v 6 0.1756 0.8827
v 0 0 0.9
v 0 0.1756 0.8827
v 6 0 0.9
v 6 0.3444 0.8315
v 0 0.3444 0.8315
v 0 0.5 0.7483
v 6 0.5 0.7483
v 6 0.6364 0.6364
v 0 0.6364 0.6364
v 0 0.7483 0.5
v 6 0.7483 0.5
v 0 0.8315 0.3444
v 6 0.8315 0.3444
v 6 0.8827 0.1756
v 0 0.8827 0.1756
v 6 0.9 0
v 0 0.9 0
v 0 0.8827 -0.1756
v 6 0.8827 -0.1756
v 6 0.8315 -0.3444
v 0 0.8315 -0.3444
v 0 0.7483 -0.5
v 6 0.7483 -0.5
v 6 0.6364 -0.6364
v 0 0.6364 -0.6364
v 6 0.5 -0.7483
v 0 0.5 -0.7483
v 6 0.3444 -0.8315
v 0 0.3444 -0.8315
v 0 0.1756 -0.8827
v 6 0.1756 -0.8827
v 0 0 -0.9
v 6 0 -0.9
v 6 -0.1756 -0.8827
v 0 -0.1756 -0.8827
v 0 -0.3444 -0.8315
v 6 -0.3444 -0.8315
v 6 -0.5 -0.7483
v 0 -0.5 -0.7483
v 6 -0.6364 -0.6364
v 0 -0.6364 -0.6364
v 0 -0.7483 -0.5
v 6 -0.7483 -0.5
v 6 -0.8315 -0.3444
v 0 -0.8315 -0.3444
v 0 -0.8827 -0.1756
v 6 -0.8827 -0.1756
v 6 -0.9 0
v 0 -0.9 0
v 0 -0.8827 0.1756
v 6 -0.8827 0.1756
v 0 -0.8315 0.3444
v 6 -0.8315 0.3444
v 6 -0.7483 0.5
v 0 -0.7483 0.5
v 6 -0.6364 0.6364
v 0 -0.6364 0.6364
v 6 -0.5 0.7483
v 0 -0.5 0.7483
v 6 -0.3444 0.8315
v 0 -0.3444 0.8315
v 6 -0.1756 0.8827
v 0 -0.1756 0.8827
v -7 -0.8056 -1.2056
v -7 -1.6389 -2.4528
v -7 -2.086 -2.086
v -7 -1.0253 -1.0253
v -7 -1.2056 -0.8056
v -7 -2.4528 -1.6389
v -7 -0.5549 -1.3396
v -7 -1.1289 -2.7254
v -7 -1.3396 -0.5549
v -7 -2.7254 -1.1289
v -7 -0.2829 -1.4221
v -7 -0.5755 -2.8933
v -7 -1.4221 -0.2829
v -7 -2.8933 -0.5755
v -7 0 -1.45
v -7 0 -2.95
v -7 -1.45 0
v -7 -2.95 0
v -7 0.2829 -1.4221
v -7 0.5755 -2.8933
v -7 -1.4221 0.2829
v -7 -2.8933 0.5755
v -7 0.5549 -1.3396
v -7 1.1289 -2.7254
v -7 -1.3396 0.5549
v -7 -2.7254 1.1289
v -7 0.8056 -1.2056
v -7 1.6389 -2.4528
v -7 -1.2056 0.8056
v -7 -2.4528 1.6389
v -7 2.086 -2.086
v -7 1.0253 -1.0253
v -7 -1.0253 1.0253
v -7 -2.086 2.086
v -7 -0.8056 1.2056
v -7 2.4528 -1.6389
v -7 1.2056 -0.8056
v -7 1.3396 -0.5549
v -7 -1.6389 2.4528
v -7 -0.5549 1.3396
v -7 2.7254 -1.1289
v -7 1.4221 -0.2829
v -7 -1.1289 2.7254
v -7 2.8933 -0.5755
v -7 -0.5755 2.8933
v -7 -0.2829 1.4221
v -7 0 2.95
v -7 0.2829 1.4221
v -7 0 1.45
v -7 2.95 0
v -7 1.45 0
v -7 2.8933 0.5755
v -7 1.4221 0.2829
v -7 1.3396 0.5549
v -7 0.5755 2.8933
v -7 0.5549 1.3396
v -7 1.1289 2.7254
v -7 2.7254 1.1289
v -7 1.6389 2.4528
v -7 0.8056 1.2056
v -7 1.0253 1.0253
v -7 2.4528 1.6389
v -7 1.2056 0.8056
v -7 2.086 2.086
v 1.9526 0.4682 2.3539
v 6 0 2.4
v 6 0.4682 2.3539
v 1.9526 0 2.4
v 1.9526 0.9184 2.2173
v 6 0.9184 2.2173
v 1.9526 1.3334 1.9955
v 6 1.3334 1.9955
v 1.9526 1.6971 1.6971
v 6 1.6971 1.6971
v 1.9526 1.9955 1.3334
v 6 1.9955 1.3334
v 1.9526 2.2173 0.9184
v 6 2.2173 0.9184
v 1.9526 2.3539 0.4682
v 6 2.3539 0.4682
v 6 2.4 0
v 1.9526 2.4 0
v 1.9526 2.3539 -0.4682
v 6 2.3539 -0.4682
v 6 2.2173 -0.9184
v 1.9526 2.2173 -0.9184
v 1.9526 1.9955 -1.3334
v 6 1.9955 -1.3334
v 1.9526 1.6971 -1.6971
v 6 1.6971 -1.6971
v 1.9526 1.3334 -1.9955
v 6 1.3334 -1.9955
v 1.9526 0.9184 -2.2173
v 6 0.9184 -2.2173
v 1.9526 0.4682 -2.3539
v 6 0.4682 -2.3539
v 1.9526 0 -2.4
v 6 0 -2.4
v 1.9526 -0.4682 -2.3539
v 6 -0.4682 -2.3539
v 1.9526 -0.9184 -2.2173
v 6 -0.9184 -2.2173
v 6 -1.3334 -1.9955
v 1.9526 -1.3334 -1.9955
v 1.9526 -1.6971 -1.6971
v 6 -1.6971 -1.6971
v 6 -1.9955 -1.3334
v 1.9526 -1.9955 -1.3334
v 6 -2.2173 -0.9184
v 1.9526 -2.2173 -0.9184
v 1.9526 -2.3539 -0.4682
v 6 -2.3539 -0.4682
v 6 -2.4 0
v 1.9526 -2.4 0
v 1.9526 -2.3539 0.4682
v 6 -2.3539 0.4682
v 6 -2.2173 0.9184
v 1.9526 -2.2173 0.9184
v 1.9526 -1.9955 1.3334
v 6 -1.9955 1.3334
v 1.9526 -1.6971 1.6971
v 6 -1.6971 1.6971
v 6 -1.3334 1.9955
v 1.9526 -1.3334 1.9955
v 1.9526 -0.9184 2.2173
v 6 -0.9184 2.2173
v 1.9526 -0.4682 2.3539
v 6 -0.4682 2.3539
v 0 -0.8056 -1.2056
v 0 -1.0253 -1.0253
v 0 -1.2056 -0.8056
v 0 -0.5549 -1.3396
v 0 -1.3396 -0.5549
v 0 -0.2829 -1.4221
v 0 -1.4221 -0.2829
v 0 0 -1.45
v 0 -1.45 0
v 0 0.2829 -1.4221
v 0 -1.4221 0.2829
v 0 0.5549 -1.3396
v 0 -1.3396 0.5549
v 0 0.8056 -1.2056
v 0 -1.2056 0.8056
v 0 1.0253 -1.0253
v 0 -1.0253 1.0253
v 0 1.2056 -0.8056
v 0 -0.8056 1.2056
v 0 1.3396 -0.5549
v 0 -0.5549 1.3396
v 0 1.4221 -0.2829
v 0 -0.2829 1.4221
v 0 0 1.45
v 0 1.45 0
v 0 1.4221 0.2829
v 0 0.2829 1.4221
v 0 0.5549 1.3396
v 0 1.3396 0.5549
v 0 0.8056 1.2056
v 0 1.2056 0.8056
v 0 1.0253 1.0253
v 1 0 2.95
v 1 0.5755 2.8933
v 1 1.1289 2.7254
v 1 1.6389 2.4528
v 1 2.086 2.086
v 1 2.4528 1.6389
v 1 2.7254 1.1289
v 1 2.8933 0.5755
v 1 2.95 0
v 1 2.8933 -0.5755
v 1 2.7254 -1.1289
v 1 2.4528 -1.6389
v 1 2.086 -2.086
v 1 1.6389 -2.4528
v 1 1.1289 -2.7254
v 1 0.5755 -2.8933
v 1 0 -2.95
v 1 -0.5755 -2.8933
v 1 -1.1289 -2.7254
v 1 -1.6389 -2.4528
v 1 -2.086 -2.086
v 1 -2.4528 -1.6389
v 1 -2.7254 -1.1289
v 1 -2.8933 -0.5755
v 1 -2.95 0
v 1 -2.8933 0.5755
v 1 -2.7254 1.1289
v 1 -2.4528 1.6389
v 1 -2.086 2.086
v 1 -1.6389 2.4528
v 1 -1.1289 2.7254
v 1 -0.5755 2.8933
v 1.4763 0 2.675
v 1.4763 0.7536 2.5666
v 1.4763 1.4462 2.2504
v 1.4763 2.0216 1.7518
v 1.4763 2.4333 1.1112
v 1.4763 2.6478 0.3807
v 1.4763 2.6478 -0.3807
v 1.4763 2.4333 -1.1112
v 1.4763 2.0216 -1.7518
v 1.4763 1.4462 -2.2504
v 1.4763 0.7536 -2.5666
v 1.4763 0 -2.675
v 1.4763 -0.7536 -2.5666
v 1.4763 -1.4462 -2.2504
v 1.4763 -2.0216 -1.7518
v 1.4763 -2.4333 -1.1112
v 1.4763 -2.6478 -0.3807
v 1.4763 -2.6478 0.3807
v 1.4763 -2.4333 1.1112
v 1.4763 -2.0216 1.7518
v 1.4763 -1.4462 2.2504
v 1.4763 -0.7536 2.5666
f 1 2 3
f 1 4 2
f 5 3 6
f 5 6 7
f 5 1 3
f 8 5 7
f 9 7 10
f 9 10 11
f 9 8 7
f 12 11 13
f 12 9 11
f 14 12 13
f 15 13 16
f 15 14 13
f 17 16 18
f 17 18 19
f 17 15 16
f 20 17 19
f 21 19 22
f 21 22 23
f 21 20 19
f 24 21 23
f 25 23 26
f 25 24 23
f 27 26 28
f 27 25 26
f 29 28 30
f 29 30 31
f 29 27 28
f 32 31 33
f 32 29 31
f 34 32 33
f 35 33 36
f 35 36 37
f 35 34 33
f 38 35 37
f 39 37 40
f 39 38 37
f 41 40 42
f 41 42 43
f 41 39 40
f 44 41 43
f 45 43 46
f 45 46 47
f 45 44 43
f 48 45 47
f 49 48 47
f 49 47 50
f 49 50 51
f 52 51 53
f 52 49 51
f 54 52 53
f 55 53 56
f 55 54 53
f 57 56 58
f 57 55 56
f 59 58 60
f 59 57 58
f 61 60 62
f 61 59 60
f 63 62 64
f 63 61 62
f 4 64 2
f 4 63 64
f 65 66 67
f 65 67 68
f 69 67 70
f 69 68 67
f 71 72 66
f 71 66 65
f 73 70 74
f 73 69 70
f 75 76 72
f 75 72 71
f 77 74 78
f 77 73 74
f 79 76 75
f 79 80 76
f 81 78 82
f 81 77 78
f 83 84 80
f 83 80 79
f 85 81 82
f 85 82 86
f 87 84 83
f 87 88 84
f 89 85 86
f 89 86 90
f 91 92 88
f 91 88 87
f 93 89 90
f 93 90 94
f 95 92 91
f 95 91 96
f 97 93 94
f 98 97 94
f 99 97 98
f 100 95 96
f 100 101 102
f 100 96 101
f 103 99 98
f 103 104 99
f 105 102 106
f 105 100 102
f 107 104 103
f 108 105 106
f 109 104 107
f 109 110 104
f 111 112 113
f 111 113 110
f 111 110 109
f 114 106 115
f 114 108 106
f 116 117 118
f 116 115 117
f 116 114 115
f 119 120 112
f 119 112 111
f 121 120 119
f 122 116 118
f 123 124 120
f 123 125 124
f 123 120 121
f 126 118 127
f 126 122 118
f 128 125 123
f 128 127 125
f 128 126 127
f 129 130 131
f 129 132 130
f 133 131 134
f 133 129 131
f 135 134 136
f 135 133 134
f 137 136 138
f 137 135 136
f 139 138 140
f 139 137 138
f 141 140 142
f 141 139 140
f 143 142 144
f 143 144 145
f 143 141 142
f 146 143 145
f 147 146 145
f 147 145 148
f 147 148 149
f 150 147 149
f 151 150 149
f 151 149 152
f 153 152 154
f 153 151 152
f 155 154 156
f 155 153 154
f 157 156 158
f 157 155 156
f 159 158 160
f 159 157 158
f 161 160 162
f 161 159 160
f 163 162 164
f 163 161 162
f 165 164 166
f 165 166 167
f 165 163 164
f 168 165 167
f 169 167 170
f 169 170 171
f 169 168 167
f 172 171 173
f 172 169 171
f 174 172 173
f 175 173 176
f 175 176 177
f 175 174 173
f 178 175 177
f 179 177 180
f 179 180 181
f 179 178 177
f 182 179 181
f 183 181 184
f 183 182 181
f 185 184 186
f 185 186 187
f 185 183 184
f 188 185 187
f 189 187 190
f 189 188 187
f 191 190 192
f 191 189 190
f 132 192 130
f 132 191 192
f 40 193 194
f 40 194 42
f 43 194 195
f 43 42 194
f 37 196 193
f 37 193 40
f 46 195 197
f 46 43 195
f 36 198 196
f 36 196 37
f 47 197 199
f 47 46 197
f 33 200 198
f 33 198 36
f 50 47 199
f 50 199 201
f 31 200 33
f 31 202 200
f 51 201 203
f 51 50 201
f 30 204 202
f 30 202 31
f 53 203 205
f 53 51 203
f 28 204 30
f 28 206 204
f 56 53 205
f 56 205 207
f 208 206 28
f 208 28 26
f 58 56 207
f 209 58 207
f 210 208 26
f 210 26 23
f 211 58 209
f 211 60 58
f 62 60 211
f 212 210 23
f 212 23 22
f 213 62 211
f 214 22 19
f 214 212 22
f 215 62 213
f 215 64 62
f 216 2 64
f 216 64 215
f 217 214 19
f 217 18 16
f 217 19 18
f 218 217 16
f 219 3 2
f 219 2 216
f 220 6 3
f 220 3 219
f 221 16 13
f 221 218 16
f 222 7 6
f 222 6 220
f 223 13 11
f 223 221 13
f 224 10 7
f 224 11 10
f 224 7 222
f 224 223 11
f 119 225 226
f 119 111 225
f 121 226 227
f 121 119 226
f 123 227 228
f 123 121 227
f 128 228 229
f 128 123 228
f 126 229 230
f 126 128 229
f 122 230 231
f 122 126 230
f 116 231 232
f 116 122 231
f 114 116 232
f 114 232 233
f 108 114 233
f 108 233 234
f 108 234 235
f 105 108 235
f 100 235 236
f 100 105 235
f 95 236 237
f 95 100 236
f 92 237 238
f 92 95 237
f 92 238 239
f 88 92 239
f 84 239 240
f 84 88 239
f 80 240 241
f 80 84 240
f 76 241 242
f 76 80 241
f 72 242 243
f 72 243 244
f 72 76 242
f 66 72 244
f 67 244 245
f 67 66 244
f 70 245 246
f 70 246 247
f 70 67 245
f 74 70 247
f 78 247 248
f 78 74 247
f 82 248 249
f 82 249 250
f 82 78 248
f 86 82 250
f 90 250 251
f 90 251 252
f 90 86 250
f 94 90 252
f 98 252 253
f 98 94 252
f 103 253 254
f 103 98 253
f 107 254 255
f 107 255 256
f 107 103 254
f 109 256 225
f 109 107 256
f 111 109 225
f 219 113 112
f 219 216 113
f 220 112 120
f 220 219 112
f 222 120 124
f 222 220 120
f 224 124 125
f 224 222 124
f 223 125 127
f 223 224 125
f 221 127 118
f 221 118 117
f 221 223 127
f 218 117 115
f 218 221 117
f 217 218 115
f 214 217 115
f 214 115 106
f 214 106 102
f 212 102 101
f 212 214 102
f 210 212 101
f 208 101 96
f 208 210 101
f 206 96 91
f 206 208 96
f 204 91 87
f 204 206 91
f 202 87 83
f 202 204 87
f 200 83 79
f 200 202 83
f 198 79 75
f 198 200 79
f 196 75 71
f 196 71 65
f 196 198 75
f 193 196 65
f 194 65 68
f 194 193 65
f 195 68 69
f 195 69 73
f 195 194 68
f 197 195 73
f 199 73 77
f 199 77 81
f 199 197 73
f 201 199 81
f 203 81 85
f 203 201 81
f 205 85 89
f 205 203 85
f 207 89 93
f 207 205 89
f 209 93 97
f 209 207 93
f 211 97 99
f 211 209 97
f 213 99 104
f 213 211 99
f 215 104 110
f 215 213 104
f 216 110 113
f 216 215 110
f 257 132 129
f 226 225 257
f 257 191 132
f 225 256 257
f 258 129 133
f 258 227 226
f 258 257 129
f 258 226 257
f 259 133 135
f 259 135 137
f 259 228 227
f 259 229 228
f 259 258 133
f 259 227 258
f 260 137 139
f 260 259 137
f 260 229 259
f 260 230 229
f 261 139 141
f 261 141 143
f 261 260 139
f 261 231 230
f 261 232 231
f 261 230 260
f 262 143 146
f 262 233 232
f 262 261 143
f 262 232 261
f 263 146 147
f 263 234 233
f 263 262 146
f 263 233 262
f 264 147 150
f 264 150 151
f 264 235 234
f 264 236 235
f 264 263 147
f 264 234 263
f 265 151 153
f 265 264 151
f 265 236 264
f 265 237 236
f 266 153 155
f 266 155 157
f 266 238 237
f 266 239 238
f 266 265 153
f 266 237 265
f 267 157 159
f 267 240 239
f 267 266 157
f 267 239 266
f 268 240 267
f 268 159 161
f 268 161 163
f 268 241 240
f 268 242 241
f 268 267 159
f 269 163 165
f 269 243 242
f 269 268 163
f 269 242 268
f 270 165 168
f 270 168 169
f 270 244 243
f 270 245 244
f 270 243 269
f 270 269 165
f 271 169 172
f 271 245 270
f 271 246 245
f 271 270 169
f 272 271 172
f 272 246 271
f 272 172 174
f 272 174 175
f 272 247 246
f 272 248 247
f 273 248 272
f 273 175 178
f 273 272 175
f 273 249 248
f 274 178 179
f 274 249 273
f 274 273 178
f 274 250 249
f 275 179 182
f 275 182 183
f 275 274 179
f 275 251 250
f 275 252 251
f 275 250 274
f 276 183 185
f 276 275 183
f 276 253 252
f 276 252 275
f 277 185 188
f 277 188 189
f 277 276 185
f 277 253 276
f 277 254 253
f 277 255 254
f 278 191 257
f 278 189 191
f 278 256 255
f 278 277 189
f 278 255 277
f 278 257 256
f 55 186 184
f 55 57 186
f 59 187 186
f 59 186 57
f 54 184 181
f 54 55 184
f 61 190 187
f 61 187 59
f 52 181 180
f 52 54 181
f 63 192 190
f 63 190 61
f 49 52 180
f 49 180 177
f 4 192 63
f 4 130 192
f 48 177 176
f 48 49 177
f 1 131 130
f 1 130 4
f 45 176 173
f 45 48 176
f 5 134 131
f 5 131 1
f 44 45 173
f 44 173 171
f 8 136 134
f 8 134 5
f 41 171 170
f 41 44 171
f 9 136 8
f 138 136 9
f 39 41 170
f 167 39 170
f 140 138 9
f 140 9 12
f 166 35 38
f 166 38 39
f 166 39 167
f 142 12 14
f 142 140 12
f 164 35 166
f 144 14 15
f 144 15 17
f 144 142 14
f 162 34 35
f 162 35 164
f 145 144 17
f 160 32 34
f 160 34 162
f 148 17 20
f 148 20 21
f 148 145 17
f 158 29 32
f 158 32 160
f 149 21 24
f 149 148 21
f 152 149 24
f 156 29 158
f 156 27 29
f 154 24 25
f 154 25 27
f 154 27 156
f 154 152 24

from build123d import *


with BuildPart() as f1:
    # F0 (on Front) → F1 (revolve)
    with BuildSketch(Plane.XZ):
        Polygon((-7, 2.95), (-7, 1.45), (0, 1.45), (0, 0.9), (6, 0.9), (6, 2.4), (1.952628, 2.4), (1, 2.4), (1, 2.95), align=None)
        Polygon((1.952628, 2.4), (1, 2.95), (1, 2.4), align=None)
    revolve(axis=Axis((-0.070939, 0, 0), (-1, 0, 0)))


solid = f1.part
